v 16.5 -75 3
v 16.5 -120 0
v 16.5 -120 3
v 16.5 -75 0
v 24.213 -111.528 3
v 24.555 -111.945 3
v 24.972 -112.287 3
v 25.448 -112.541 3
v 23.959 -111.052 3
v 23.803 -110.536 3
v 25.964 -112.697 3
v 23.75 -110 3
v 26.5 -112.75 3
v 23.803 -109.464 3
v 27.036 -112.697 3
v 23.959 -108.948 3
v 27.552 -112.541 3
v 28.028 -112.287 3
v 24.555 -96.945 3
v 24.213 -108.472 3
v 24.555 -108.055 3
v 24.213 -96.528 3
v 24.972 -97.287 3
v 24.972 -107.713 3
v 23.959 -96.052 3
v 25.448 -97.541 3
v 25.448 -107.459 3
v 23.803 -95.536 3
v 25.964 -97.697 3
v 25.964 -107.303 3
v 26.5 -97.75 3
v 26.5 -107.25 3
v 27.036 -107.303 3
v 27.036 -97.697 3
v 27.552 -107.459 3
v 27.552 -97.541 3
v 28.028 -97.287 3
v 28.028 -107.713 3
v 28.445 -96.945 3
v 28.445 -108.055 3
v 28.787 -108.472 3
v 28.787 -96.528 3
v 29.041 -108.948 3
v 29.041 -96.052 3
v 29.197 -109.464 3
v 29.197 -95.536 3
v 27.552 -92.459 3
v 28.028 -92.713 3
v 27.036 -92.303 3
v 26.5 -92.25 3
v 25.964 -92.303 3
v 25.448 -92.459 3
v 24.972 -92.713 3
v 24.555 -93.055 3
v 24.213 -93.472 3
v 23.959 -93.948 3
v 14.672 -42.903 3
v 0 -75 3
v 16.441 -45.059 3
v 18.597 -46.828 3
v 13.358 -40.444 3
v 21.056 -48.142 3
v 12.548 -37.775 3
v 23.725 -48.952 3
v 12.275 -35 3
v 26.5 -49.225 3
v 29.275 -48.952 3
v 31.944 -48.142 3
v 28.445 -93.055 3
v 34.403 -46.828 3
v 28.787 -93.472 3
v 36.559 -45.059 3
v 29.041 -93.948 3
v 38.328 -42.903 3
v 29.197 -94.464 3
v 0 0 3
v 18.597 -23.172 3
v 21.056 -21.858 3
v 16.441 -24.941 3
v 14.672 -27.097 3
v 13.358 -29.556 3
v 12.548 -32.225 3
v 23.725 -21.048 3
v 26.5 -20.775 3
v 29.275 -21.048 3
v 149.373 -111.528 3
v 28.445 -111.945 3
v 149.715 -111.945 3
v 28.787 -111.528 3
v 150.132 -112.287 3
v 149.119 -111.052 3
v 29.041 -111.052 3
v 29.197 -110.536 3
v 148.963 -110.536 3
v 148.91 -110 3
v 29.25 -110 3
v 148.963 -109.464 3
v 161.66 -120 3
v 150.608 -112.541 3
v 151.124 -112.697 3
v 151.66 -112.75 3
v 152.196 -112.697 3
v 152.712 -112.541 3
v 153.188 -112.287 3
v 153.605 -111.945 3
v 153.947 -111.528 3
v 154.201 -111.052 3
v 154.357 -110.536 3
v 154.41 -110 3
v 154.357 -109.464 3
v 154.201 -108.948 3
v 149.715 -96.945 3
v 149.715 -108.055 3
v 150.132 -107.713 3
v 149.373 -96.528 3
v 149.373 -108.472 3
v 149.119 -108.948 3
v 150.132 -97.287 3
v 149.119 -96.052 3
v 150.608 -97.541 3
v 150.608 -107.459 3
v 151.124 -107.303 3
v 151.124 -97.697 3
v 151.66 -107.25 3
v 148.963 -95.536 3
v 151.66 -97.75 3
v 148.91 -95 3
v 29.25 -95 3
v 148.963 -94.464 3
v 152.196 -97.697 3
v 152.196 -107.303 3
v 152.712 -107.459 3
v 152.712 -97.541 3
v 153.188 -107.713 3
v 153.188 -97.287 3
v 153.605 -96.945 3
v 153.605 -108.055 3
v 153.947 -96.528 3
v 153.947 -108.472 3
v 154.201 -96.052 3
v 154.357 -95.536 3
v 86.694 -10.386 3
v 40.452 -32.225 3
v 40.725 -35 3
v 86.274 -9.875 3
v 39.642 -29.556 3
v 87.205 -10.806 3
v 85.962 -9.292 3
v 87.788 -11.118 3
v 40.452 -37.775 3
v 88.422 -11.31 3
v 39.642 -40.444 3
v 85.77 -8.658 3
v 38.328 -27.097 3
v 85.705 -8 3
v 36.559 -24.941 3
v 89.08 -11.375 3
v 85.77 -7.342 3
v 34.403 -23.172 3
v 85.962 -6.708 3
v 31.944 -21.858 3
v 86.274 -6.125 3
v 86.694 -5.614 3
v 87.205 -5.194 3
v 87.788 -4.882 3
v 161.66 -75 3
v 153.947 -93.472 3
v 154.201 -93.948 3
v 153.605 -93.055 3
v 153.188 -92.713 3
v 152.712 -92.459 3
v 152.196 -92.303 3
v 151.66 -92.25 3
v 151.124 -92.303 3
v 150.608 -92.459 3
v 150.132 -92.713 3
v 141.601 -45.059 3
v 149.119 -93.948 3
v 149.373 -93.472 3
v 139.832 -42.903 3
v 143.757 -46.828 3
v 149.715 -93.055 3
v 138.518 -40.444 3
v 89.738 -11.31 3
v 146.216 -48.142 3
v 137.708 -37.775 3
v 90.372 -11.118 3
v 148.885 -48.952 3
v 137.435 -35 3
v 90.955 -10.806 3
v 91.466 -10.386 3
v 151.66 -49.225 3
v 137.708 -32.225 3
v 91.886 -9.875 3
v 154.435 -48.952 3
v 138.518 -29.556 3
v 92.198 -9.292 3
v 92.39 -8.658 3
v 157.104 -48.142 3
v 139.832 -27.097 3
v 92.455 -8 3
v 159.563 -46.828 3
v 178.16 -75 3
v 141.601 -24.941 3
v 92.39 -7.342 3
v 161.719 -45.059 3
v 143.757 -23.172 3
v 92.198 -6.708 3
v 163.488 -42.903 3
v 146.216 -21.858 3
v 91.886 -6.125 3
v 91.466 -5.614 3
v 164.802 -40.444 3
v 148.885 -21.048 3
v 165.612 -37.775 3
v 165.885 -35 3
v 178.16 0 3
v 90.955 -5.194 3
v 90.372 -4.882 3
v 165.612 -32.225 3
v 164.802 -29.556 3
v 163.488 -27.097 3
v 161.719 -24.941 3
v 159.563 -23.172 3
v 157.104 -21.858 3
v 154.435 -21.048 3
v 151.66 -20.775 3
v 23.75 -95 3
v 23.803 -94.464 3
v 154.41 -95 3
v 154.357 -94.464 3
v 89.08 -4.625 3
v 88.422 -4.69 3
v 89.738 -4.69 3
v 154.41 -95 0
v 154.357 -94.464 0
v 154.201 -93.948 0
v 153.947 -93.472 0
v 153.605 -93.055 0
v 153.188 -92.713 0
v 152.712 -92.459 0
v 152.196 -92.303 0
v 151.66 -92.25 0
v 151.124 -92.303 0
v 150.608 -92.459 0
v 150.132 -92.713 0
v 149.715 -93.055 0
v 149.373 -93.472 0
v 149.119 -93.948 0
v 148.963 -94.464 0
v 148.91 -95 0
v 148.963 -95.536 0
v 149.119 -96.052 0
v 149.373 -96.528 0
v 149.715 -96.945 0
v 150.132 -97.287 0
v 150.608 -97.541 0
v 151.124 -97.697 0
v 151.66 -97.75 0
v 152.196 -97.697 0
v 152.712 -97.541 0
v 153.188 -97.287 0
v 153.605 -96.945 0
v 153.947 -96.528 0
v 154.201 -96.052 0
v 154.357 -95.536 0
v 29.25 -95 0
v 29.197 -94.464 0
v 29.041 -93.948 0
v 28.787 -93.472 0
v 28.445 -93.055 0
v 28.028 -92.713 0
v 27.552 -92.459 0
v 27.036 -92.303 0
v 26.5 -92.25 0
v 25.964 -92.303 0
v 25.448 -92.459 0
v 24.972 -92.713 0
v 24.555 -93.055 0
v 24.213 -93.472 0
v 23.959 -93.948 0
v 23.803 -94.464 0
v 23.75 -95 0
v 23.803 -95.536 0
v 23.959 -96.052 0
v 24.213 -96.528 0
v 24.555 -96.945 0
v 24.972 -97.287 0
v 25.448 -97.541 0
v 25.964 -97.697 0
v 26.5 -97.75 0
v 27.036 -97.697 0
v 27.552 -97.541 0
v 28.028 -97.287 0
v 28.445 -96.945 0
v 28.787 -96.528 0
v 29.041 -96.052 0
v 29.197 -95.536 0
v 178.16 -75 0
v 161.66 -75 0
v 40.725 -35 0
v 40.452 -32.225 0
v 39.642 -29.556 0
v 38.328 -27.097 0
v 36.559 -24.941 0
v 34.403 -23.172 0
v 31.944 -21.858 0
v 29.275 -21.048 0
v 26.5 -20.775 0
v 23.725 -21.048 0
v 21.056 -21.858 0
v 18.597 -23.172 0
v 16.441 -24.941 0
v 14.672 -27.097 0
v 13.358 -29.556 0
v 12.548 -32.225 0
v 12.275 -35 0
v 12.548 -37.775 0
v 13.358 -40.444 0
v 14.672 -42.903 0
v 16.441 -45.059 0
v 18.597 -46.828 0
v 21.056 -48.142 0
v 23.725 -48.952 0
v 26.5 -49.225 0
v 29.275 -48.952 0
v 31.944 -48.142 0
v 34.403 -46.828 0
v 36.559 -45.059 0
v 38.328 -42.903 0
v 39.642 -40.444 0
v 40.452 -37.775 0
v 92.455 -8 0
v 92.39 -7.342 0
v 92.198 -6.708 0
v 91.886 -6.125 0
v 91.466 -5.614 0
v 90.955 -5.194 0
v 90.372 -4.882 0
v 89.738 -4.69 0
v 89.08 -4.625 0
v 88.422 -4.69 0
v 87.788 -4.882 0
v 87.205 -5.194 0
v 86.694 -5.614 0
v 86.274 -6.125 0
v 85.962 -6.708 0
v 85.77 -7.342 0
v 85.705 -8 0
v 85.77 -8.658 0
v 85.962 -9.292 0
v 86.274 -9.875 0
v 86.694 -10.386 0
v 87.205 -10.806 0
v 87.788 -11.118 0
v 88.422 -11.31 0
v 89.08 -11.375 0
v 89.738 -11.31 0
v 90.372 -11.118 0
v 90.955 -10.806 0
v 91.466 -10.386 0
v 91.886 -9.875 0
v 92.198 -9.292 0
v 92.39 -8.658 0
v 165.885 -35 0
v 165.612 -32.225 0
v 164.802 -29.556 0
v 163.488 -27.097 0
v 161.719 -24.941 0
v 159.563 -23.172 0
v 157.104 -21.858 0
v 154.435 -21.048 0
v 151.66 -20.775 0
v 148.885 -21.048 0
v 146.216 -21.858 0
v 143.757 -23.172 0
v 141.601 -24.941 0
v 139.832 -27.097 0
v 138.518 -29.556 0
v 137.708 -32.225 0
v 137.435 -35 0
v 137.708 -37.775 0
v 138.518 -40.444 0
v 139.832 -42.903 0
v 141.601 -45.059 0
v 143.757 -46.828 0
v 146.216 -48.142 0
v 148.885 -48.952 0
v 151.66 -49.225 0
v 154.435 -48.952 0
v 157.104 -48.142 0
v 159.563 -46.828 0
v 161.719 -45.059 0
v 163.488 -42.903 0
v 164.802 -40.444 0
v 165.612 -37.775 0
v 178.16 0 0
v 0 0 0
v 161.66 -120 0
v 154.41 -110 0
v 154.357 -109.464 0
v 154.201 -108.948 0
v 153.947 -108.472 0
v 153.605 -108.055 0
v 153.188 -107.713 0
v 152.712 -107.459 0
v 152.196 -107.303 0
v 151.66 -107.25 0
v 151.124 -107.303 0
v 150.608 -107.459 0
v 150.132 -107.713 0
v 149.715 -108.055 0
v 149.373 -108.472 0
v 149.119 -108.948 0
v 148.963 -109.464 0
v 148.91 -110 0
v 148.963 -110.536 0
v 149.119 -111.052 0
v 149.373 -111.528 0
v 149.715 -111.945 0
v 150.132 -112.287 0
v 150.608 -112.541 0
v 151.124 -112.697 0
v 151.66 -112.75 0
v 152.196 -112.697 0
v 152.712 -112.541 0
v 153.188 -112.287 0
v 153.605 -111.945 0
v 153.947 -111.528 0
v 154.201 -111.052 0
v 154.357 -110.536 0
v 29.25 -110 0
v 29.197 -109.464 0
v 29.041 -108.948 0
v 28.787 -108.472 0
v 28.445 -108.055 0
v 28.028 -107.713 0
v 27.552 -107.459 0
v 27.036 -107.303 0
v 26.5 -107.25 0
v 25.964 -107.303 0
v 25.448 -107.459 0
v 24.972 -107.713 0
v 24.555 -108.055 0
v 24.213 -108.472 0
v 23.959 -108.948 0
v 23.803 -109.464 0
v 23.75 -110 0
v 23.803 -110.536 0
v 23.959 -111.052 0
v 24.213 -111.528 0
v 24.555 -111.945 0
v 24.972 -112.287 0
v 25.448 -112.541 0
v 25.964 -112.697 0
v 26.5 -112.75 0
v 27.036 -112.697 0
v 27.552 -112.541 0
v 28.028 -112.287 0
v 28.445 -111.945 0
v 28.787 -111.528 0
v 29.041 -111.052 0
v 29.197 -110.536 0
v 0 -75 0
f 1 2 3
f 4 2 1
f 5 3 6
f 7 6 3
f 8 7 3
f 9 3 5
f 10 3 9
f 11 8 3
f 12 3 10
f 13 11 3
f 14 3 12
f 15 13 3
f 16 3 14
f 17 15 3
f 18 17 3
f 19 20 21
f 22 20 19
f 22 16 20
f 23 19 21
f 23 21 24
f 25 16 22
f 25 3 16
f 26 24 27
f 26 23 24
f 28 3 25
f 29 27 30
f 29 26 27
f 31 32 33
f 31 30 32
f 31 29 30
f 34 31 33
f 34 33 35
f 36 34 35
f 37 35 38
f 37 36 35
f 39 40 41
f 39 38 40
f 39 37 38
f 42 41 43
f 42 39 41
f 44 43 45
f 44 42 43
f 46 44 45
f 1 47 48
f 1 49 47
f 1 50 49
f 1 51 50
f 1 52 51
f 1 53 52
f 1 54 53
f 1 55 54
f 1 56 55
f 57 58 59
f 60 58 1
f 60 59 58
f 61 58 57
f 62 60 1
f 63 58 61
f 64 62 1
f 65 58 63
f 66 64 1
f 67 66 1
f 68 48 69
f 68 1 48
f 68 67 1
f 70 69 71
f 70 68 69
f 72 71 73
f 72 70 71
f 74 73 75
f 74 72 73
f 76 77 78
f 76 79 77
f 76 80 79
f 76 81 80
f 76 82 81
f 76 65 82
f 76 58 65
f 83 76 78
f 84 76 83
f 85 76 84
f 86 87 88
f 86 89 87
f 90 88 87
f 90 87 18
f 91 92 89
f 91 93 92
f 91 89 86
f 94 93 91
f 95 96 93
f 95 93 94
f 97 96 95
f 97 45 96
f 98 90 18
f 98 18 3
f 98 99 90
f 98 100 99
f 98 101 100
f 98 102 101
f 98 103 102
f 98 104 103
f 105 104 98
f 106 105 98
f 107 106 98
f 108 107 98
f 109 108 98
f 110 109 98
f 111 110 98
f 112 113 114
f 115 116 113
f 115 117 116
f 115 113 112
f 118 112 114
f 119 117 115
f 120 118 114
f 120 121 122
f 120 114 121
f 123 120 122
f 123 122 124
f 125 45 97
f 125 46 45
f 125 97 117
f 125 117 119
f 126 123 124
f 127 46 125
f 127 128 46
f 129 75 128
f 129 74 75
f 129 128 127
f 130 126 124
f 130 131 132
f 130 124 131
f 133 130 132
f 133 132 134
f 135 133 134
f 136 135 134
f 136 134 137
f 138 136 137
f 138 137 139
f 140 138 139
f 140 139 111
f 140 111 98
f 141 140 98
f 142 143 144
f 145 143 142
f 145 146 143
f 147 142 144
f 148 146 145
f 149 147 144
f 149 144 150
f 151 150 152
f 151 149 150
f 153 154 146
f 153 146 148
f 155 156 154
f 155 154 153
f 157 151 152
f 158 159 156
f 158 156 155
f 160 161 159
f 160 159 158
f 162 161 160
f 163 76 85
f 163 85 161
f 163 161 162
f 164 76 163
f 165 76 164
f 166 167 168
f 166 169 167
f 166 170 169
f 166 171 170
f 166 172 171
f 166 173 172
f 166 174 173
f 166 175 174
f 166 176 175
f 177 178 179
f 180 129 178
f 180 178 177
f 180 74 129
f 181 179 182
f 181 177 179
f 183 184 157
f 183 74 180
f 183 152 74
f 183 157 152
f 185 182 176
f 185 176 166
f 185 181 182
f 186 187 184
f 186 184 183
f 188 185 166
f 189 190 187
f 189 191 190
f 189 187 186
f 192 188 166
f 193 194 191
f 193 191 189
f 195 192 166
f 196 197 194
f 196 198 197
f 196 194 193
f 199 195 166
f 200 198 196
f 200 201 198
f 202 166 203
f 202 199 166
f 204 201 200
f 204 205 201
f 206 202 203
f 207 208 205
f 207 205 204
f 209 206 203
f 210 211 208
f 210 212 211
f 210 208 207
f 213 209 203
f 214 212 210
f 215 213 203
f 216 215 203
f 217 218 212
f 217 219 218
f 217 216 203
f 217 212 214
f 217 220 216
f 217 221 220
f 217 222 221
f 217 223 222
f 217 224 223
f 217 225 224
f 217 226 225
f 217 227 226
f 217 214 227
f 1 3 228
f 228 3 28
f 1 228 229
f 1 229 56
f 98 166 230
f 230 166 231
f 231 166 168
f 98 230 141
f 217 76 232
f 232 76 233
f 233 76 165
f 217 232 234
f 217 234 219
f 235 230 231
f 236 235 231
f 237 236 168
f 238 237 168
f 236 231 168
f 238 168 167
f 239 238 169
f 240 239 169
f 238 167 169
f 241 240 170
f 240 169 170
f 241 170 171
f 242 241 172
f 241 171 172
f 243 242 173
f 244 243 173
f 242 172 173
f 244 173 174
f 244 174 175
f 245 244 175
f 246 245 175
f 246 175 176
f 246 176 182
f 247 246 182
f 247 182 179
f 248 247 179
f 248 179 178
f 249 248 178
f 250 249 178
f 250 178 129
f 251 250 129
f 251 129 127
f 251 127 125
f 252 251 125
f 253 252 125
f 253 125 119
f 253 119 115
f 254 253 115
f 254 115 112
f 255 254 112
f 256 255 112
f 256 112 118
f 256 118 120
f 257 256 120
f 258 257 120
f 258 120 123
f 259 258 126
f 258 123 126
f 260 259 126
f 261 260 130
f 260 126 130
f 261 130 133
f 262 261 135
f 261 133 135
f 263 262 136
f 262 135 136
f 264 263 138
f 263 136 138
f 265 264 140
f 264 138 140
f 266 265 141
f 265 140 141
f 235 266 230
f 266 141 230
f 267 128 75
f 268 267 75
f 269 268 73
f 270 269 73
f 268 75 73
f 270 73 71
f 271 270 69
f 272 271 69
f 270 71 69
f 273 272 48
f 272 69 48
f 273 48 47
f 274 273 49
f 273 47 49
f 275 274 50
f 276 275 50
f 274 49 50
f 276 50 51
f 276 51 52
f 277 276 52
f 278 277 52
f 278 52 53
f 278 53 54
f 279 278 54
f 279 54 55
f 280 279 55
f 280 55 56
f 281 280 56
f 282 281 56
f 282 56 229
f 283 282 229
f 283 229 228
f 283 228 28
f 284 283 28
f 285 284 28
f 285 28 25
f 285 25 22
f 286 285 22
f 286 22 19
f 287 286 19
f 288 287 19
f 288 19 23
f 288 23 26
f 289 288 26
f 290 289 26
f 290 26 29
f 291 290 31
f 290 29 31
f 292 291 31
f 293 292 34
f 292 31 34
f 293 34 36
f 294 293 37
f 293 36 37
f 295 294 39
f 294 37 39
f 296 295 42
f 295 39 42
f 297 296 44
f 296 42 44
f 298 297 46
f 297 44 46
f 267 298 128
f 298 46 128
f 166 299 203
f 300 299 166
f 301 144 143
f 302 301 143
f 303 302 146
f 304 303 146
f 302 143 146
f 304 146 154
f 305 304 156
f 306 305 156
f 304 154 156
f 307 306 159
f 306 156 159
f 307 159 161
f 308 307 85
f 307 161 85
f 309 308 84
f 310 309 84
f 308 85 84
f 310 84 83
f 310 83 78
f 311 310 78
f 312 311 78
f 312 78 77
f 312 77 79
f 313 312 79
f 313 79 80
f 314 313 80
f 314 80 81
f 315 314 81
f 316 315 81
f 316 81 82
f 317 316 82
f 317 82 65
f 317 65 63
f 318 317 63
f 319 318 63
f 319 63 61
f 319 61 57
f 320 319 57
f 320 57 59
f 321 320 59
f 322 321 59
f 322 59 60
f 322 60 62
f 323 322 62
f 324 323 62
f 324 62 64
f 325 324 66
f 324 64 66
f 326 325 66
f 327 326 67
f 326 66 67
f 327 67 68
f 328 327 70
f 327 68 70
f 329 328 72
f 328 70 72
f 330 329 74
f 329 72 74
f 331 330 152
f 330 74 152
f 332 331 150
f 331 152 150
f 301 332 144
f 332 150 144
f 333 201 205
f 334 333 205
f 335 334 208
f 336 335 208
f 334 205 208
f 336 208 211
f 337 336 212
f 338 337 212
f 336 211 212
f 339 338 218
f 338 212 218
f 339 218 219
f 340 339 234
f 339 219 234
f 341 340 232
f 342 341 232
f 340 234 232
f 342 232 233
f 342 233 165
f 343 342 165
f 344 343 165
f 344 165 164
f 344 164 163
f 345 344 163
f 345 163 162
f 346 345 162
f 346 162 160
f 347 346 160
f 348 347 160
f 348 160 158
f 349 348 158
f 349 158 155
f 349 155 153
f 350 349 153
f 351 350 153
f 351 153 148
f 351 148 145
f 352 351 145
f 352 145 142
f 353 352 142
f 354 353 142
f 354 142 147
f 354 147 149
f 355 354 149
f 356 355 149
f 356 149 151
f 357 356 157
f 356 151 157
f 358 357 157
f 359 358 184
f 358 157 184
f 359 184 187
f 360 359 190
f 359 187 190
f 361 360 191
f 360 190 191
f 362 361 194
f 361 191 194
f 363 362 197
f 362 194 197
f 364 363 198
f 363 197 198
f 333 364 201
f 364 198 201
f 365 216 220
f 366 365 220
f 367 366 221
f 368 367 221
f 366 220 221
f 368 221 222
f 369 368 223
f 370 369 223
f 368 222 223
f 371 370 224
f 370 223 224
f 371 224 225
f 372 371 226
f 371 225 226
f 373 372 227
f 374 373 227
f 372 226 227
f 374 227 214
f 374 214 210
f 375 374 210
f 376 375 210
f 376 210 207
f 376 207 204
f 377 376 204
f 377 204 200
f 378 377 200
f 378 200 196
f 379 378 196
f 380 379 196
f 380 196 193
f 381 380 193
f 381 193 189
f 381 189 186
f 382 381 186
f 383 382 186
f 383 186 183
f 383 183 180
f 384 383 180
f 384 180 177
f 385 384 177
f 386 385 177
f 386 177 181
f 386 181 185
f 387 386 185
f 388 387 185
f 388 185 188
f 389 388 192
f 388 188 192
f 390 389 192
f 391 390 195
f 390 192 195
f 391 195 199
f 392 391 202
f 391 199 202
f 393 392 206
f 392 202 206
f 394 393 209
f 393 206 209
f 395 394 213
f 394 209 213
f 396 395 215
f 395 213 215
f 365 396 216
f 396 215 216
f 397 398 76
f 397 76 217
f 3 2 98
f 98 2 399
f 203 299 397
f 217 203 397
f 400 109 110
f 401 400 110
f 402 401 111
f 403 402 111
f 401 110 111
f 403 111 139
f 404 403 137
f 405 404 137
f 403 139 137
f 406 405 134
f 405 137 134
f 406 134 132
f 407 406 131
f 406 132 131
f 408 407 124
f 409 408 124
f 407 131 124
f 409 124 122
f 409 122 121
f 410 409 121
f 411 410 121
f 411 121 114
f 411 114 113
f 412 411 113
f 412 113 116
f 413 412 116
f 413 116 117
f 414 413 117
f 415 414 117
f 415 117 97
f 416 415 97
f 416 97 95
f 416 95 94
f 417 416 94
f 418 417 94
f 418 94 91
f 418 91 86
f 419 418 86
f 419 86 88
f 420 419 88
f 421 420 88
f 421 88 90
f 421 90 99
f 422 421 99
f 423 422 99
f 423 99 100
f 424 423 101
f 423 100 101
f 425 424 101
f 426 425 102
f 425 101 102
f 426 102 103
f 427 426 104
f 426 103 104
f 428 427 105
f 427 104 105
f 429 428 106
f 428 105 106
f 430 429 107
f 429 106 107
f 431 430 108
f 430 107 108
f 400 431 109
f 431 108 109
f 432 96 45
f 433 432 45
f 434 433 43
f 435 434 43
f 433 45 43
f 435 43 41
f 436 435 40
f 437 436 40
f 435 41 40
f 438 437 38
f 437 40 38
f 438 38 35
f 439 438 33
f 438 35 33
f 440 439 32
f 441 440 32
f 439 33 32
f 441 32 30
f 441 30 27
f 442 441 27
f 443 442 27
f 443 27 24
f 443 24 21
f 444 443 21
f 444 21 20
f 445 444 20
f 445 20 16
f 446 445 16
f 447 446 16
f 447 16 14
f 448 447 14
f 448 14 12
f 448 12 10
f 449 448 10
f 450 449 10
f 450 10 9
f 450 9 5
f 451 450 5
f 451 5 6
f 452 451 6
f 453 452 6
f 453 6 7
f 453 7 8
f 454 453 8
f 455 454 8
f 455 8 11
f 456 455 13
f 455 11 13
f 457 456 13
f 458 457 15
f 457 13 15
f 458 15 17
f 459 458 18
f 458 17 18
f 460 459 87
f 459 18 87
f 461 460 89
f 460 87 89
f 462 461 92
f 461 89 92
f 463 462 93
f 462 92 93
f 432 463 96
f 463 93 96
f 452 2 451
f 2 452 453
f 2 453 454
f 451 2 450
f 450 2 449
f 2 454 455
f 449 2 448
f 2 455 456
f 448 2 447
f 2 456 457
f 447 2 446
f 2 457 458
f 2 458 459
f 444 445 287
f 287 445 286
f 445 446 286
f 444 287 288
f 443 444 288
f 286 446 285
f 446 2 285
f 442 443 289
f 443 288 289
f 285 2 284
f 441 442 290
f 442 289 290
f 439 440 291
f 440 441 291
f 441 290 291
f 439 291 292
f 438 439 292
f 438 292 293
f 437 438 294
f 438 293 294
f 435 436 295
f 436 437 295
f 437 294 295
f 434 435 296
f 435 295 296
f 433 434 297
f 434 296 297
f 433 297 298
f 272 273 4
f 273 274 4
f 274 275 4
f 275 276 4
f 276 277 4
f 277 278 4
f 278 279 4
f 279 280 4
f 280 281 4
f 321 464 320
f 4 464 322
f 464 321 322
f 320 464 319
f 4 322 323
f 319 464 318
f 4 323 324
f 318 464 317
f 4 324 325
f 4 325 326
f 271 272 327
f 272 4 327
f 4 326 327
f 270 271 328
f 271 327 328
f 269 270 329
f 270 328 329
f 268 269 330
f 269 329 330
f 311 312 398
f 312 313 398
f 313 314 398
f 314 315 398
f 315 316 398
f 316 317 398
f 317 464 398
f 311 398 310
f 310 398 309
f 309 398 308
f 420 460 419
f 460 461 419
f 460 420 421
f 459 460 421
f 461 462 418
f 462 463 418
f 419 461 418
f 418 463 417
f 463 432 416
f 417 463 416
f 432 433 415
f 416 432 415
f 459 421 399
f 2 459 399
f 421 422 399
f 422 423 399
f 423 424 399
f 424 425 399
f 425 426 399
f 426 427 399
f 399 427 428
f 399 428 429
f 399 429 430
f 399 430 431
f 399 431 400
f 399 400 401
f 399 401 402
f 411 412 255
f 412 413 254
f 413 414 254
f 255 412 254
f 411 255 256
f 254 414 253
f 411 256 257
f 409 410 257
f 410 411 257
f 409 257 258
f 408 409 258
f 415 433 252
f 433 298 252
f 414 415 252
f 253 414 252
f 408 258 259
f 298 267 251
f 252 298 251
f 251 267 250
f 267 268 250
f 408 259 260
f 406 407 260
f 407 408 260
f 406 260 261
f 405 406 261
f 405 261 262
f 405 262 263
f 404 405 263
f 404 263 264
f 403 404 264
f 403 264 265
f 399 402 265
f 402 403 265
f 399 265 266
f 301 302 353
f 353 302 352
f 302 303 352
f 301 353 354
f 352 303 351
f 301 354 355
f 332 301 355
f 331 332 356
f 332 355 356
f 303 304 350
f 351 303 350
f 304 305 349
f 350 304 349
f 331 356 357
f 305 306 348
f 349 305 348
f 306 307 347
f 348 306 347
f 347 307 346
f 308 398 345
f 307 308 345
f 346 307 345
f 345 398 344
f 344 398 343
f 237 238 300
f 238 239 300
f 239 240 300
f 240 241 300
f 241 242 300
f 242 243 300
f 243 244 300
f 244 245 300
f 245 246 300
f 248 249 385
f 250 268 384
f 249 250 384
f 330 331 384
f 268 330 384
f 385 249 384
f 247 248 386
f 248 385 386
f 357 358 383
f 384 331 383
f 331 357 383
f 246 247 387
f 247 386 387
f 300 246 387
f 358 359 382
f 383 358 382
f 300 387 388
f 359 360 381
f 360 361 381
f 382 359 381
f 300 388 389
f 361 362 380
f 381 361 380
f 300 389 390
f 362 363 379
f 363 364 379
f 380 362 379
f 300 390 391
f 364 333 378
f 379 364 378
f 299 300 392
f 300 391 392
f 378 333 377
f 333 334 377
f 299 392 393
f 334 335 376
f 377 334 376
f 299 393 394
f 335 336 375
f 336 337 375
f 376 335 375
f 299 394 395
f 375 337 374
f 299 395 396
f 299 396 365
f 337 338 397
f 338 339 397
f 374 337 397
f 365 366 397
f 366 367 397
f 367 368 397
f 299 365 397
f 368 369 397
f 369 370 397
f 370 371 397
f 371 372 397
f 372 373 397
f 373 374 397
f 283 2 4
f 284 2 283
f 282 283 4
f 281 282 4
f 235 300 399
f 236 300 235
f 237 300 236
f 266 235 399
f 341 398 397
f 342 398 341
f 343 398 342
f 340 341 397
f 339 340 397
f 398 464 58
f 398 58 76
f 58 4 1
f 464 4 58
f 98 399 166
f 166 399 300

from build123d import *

# Parameters (mm, degrees)
SKETCH1_W           = 178.16
SKETCH1_H           = 120
BOSS_EXTRUDE1_DEPTH = 3
SKETCH2_R           = 14.225
SKETCH2_R_2         = 2.75
SKETCH2_R_3         = 3.375
CUT_EXTRUDE1_DEPTH  = 4
SKETCH3_W           = 16.5
SKETCH3_H           = 45
CUT_EXTRUDE2_DEPTH  = 4


with BuildPart() as part:
    # Sketch1 → Boss-Extrude1 (new body)
    with BuildSketch(Plane.XY):
        with Locations((89.08, -60)):
            Rectangle(SKETCH1_W, SKETCH1_H)
    extrude(amount=BOSS_EXTRUDE1_DEPTH)

    # Sketch2 → Cut-Extrude1 (cut, through all)
    with BuildSketch(Plane.XY.offset(3)):
        with Locations((26.5, -35)):
            Circle(SKETCH2_R)
        with Locations((151.66, -35)):
            Circle(SKETCH2_R)
        with Locations((26.5, -110)):
            Circle(SKETCH2_R_2)
        with Locations((151.66, -110)):
            Circle(SKETCH2_R_2)
        with Locations((89.08, -8)):
            Circle(SKETCH2_R_3)
        with Locations((26.5, -95)):
            Circle(SKETCH2_R_2)
        with Locations((151.66, -95)):
            Circle(SKETCH2_R_2)
    extrude(amount=-CUT_EXTRUDE1_DEPTH, mode=Mode.SUBTRACT)

    # Sketch3 → Cut-Extrude2 (cut, through all)
    with BuildSketch(Plane(origin=(0, 0, 0), x_dir=(-1, 0, 0), z_dir=(0, 0, -1))):
        with Locations((-8.25, -97.5)):
            Rectangle(SKETCH3_W, SKETCH3_H)
        with Locations((-169.91, -97.5)):
            Rectangle(SKETCH3_W, SKETCH3_H)
    extrude(amount=-CUT_EXTRUDE2_DEPTH, mode=Mode.SUBTRACT)


solid = part.part
